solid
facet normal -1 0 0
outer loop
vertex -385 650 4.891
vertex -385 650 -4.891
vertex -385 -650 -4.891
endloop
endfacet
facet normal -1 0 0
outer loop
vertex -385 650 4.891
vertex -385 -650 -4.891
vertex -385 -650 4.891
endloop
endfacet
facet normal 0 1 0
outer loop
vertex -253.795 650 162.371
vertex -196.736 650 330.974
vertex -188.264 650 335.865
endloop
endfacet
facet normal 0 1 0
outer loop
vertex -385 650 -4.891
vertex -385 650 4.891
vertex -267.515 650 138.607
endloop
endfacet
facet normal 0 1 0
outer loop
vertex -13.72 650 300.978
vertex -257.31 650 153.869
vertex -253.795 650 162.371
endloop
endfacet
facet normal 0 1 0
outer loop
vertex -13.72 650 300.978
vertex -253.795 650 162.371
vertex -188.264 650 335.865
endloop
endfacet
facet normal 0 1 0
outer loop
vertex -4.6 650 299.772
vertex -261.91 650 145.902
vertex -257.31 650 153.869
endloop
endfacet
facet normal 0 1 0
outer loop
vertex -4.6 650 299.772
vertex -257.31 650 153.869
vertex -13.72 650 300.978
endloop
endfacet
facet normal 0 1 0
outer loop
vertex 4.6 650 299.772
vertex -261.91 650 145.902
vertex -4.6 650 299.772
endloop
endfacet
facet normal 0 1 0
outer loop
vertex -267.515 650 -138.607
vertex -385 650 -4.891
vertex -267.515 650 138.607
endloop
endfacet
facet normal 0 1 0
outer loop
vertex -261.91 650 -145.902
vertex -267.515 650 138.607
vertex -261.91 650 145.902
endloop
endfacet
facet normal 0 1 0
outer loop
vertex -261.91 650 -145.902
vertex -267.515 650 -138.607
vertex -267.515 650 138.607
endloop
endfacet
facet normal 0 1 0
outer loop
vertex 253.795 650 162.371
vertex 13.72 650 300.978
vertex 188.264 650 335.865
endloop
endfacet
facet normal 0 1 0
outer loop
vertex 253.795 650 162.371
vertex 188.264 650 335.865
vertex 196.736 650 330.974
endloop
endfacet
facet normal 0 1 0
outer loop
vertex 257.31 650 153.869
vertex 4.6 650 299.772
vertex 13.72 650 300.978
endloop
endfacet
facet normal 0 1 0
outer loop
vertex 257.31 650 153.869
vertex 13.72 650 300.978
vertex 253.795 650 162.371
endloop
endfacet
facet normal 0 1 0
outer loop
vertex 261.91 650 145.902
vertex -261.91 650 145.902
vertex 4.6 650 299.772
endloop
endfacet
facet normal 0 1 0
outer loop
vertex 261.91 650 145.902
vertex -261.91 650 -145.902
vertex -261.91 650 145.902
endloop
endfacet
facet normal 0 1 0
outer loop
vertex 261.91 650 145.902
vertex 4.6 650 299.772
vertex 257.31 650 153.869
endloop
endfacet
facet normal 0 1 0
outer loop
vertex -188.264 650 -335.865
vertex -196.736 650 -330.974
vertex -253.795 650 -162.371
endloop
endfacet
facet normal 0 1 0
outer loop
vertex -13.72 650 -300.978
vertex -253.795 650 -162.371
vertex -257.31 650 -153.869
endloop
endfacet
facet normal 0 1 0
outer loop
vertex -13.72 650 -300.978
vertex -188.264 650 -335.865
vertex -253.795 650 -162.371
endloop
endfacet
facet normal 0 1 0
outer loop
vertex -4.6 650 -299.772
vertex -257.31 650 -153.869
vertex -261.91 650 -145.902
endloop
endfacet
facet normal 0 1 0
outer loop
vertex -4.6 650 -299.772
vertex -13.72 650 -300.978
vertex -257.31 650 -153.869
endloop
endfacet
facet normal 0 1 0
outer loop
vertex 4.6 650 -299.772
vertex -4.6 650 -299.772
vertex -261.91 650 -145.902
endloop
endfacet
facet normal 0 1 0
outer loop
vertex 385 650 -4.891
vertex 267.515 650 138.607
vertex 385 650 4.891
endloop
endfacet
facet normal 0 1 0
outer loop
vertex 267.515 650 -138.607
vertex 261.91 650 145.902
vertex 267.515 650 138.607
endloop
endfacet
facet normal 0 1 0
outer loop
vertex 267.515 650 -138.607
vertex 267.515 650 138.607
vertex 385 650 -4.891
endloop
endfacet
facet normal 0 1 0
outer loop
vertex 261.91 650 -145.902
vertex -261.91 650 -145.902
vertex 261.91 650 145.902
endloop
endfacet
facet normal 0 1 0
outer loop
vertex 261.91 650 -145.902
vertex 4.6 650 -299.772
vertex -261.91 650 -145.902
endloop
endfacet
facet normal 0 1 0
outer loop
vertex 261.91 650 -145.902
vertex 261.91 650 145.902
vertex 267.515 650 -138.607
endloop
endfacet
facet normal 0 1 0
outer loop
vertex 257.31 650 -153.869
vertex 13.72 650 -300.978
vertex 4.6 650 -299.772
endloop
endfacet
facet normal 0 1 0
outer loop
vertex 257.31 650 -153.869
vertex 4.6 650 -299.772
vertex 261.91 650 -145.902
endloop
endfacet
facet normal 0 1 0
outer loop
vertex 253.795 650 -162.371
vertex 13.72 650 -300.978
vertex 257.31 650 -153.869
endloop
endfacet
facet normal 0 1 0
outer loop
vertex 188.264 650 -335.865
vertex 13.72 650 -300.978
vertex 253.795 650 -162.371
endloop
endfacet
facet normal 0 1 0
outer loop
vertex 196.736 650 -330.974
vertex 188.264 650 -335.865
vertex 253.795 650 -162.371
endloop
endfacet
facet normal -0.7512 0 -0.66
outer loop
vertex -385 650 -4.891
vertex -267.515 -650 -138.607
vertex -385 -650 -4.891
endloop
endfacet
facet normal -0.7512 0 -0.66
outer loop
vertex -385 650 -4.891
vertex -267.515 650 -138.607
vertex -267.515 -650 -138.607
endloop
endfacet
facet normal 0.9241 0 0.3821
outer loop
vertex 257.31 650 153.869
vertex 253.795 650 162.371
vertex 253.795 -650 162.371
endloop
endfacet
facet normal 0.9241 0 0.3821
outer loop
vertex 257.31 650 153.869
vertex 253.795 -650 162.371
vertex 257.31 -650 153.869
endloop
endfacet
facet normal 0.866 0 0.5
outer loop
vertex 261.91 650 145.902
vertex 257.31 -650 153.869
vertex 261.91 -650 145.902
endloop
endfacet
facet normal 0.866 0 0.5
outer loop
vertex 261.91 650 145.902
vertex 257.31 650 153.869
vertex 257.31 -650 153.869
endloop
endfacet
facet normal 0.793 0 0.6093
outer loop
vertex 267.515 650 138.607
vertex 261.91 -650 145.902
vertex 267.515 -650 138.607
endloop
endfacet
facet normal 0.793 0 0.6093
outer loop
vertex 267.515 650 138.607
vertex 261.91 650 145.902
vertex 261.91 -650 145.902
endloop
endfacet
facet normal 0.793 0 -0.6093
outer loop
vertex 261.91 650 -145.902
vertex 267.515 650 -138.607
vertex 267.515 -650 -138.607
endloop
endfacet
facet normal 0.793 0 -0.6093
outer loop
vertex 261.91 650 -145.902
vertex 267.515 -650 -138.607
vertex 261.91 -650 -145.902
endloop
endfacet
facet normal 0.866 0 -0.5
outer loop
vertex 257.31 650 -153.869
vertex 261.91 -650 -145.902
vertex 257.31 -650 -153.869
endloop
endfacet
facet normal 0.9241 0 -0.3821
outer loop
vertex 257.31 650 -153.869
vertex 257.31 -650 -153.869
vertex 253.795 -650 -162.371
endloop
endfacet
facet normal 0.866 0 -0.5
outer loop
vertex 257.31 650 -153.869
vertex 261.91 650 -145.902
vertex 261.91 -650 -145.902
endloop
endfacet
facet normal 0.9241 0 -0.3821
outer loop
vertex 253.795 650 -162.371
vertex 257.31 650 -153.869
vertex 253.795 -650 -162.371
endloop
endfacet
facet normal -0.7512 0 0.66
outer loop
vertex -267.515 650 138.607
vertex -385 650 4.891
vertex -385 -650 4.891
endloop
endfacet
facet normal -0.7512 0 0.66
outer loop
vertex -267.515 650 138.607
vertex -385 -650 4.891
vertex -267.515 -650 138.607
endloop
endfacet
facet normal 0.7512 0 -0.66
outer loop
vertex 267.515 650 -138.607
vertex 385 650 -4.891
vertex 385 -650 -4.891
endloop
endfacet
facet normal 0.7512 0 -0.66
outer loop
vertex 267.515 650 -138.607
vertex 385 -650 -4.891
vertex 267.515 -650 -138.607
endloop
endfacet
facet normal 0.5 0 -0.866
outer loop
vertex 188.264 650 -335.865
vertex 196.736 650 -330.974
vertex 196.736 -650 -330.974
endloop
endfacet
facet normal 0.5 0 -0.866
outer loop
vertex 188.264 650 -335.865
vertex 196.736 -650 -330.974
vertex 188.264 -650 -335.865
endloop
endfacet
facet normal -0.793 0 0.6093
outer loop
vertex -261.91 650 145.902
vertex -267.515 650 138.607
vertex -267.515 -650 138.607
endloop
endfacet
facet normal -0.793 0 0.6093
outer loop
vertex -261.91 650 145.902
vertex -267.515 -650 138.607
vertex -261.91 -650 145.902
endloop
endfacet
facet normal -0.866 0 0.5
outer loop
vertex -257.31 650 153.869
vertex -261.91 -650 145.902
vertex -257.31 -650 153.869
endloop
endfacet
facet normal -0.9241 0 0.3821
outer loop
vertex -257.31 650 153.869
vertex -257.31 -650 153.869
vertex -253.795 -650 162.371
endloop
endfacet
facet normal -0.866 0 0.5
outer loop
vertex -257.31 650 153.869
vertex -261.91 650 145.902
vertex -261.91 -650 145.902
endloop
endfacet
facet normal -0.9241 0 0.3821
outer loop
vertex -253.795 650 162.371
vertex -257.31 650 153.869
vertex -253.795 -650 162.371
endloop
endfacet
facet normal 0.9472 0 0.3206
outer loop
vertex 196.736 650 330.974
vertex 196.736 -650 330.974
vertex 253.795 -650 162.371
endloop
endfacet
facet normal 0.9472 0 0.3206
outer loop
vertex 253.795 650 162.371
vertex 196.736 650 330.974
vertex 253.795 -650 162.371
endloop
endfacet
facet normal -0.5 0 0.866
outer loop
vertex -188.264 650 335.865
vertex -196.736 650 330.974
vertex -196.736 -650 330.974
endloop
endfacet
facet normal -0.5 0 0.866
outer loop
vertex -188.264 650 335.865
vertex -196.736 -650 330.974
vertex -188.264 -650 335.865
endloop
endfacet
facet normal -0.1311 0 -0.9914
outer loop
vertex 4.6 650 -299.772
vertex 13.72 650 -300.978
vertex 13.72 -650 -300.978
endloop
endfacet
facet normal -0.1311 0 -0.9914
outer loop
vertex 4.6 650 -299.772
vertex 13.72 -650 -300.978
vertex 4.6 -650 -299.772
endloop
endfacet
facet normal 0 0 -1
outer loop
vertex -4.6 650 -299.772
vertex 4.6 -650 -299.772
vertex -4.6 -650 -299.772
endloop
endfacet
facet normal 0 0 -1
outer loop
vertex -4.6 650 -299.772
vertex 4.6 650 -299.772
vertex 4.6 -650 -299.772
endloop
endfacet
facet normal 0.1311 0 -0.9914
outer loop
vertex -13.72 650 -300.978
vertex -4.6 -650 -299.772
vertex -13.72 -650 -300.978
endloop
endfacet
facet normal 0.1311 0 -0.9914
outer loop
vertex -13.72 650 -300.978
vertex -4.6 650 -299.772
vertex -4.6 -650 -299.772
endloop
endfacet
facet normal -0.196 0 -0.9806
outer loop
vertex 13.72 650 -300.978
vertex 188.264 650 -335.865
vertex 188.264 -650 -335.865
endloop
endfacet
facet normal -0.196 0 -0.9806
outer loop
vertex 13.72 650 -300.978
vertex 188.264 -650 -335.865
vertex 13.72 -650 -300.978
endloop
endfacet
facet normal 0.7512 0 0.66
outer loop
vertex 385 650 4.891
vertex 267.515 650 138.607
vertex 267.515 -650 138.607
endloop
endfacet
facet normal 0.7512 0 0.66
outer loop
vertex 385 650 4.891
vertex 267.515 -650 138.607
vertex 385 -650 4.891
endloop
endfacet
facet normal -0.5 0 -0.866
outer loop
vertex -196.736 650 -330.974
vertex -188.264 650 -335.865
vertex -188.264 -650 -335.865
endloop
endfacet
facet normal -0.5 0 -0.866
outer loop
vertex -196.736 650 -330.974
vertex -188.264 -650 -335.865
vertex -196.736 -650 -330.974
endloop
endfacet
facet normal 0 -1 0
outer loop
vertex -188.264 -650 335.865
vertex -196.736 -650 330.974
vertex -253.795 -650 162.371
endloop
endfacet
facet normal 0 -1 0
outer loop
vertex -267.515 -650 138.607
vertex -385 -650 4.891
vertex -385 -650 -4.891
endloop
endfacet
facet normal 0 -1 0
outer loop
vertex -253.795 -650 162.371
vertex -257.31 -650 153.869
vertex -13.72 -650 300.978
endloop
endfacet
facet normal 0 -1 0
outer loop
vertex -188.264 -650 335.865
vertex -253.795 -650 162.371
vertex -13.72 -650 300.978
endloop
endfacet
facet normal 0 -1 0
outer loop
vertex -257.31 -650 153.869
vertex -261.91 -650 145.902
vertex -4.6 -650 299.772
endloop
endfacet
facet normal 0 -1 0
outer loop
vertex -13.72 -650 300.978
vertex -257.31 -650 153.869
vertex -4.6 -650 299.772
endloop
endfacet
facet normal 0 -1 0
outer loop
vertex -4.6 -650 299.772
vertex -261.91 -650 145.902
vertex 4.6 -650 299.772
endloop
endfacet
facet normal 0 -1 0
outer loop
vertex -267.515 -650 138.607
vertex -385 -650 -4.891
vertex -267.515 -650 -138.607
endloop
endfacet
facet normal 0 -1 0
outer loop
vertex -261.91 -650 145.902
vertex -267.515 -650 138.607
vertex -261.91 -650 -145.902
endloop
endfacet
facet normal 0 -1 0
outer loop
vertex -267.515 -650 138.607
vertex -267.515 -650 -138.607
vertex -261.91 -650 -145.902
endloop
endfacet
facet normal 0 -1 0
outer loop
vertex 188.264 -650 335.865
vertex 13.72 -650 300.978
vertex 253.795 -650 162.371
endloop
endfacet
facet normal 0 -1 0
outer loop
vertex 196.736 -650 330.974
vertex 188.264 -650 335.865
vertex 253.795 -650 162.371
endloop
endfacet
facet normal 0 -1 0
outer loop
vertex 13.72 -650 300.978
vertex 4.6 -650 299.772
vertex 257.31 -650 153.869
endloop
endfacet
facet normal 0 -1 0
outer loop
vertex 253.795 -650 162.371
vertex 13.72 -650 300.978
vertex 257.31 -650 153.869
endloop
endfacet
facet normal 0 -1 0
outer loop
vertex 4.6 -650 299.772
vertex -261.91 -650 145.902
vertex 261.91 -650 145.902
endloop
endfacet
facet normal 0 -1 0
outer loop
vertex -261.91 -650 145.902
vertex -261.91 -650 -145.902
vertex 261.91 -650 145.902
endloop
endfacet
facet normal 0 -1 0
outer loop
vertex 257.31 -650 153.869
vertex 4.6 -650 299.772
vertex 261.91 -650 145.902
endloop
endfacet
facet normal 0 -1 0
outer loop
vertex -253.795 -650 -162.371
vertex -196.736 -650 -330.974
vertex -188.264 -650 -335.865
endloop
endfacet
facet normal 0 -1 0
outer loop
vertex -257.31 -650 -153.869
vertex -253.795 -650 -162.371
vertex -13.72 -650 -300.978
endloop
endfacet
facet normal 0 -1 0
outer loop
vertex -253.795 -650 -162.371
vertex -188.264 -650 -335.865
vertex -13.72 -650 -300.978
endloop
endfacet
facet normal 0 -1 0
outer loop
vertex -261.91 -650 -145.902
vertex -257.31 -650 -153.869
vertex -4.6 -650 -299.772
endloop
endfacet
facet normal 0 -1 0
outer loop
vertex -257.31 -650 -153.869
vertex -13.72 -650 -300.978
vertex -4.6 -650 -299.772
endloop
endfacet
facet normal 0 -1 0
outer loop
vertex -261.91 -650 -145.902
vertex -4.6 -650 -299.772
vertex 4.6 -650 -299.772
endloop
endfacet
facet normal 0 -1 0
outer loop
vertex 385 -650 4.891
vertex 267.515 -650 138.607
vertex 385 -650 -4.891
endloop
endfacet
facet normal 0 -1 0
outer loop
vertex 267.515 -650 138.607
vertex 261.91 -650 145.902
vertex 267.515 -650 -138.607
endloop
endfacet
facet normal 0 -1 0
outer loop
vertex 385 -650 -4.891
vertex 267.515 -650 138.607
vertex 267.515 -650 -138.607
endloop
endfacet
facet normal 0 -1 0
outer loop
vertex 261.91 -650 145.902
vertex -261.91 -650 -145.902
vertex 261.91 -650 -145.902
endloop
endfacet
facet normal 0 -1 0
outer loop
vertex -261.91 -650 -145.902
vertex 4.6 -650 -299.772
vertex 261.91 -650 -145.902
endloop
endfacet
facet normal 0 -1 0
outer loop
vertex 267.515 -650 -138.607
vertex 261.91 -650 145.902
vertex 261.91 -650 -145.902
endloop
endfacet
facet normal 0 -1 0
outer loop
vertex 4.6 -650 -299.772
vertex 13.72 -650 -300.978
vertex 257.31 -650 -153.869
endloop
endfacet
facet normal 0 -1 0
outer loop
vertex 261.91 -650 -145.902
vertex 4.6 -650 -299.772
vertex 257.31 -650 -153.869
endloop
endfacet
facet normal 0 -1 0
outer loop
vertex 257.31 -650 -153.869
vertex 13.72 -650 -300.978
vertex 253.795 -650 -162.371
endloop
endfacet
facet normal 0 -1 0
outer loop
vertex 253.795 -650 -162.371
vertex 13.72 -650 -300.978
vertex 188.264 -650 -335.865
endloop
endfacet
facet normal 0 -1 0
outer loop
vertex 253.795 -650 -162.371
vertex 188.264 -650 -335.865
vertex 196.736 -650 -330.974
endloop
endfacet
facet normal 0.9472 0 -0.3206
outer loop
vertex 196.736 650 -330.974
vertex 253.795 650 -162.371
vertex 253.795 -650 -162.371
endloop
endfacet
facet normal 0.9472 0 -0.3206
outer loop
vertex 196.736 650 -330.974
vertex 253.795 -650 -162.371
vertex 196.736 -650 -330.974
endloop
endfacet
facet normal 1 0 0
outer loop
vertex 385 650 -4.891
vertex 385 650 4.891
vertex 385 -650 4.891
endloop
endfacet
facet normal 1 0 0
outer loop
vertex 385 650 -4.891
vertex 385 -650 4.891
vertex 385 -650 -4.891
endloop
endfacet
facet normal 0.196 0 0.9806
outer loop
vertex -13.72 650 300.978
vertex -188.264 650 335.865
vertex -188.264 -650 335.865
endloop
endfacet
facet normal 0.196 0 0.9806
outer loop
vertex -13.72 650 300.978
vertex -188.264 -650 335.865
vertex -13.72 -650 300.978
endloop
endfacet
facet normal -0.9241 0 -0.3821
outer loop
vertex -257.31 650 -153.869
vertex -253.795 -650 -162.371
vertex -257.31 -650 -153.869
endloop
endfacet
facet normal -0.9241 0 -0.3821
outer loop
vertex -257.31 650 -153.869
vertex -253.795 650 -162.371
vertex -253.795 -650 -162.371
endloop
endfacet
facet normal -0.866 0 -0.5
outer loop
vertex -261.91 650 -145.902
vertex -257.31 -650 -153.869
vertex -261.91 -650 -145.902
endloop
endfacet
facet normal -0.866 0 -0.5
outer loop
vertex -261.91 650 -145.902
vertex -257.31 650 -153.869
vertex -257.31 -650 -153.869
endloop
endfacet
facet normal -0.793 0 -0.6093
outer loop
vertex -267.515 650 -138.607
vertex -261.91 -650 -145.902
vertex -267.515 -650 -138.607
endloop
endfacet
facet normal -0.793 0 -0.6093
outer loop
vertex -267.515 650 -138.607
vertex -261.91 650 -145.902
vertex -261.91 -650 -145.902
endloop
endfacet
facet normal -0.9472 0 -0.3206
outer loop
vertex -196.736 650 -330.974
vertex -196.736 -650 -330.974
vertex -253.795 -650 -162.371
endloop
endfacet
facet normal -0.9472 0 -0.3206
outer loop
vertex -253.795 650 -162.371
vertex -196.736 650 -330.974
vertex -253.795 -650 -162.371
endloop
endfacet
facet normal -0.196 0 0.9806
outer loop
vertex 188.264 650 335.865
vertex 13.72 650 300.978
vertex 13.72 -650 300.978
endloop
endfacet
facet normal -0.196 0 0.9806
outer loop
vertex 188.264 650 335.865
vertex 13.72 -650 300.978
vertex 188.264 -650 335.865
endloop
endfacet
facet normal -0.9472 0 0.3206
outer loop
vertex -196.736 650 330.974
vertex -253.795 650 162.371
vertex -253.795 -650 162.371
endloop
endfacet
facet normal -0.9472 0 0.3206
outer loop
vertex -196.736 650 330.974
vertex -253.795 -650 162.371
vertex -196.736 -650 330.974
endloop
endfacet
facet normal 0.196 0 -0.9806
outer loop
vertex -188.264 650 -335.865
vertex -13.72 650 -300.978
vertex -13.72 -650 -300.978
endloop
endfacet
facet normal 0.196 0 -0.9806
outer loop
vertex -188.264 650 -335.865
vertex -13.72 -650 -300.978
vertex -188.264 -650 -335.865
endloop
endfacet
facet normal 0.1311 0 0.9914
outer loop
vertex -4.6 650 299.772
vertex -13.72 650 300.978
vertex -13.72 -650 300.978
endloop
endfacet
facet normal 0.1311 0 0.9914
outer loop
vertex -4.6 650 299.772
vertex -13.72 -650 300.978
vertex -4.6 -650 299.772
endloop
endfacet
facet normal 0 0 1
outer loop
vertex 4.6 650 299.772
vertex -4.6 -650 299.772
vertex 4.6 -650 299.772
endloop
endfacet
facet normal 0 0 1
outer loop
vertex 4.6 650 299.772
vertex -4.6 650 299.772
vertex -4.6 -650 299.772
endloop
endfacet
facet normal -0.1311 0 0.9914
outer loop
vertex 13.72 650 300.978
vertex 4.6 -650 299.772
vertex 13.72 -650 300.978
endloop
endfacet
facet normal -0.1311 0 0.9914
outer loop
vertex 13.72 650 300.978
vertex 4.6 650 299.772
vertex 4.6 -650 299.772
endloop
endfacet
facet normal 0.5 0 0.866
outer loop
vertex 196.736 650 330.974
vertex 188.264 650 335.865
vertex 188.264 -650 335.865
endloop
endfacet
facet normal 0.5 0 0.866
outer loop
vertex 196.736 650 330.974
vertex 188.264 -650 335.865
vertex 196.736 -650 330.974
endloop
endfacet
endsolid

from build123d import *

# Parameters (mm, degrees)
EXTRUDE_1_DEPTH = 650


with BuildPart() as part:
    # 草图5 → 凸台-拉伸1 (new body, symmetric)
    with BuildSketch(Plane(origin=(0, 0, 0), x_dir=(1, 0, 0), z_dir=(0, 1, 0))):
        with BuildLine():
            Line((-267.514659832, 138.60716948), (-385, 4.891224703))
            Line((-385, 4.891224703), (-385, -4.891224703))
            Line((-385, -4.891224703), (-267.514659832, -138.60716948))
            ThreePointArc((-267.514659832, -138.60716948), (-259.47883349, -149.810174364), (-253.794659832, -162.37090656))
            Line((-253.794659832, -162.37090656), (-196.735924848, -330.974168106))
            Line((-196.735924848, -330.974168106), (-188.264075152, -335.865392808))
            Line((-188.264075152, -335.865392808), (-13.72, -300.978076039))
            ThreePointArc((-13.72, -300.978076039), (0, -299.620348729), (13.72, -300.978076039))
            Line((13.72, -300.978076039), (188.264075152, -335.865392808))
            Line((188.264075152, -335.865392808), (196.735924848, -330.974168106))
            Line((196.735924848, -330.974168106), (253.794659832, -162.37090656))
            ThreePointArc((253.794659832, -162.37090656), (259.47883349, -149.810174364), (267.514659832, -138.60716948))
            Line((267.514659832, -138.60716948), (385, -4.891224703))
            Line((385, -4.891224703), (385, 4.891224703))
            Line((385, 4.891224703), (267.514659832, 138.60716948))
            ThreePointArc((267.514659832, 138.60716948), (259.47883349, 149.810174364), (253.794659832, 162.37090656))
            Line((253.794659832, 162.37090656), (196.735924848, 330.974168106))
            Line((196.735924848, 330.974168106), (188.264075152, 335.865392808))
            Line((188.264075152, 335.865392808), (13.72, 300.978076039))
            ThreePointArc((13.72, 300.978076039), (0, 299.620348729), (-13.72, 300.978076039))
            Line((-13.72, 300.978076039), (-188.264075152, 335.865392808))
            Line((-188.264075152, 335.865392808), (-196.735924848, 330.974168106))
            Line((-196.735924848, 330.974168106), (-253.794659832, 162.37090656))
            ThreePointArc((-253.794659832, 162.37090656), (-259.47883349, 149.810174364), (-267.514659832, 138.60716948))
        make_face()
    extrude(amount=EXTRUDE_1_DEPTH, both=True)


solid = part.part
